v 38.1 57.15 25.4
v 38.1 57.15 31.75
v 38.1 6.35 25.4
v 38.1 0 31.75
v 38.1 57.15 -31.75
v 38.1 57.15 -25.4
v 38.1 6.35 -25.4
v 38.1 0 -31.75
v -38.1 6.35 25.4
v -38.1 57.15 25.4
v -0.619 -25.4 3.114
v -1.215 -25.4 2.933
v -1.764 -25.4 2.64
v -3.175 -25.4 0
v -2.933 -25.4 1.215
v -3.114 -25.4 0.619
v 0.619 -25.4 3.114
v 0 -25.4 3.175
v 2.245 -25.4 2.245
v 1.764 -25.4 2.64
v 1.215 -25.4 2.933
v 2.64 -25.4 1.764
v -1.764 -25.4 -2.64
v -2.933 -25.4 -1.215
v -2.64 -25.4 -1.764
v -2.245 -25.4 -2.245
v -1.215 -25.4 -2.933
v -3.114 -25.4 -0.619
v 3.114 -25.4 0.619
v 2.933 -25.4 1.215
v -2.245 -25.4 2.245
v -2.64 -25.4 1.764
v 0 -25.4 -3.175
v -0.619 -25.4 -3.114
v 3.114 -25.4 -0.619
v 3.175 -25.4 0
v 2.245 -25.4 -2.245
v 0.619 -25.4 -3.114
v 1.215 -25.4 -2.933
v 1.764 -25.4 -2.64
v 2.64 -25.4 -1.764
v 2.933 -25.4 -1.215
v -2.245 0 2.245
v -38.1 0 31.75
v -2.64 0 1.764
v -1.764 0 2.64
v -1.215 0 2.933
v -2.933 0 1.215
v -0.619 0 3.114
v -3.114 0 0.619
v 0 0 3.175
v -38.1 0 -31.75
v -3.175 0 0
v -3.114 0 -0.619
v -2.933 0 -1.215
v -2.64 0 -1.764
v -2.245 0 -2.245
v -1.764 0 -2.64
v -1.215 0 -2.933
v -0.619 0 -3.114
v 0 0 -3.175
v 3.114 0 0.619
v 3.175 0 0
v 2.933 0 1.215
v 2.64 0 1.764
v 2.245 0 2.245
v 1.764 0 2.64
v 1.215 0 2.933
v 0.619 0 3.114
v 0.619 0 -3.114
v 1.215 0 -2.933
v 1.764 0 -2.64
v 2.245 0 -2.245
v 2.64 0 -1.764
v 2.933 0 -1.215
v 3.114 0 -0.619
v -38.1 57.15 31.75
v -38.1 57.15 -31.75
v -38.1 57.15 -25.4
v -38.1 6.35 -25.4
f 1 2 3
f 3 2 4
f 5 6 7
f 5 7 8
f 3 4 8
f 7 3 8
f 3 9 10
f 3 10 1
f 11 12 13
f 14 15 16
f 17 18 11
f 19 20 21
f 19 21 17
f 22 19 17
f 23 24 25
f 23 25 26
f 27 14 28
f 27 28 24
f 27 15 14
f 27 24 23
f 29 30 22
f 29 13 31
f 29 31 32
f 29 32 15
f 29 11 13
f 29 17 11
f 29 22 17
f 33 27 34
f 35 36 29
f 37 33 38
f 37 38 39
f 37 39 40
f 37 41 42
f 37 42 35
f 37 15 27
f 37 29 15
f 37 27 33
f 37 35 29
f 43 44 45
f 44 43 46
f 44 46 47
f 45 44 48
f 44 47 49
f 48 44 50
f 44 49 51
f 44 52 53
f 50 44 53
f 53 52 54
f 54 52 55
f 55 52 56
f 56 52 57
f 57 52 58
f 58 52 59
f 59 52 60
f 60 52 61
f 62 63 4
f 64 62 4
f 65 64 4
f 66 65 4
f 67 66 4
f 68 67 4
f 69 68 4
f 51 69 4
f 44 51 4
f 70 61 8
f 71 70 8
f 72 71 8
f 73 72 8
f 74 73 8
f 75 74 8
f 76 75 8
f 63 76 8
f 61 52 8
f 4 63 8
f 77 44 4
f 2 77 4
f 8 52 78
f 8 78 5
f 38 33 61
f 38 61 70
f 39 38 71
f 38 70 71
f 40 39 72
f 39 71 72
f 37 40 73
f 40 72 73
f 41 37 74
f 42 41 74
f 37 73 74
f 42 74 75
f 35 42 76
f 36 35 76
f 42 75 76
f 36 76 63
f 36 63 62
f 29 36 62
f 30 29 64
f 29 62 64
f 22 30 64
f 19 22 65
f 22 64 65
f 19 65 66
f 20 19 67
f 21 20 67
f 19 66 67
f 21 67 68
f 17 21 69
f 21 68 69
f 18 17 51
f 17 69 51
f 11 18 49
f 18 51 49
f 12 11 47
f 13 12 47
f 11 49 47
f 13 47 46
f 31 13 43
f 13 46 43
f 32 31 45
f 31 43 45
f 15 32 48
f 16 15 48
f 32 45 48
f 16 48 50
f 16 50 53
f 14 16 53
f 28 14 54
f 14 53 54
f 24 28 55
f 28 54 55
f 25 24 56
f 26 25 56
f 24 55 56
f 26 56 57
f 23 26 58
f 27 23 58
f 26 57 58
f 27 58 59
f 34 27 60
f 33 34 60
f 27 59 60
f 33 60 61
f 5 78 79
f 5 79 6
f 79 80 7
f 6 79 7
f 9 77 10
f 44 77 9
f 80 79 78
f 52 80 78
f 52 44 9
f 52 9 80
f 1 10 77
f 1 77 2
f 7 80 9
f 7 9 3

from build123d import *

# Parameters (mm, degrees)
SKETCH1_W           = 76.2
SKETCH1_H           = 63.5
BOSS_EXTRUDE1_DEPTH = 6.35
SKETCH2_W           = 76.2
SKETCH2_H           = 6.35
BOSS_EXTRUDE2_DEPTH = 50.8
SKETCH3_R           = 3.175
BOSS_EXTRUDE3_DEPTH = 25.4


with BuildPart() as part:
    # Sketch1 → Boss-Extrude1 (new body)
    with BuildSketch(Plane(origin=(0, 0, 0), x_dir=(1, 0, 0), z_dir=(0, 1, 0))):
        Rectangle(SKETCH1_W, SKETCH1_H)
    extrude(amount=BOSS_EXTRUDE1_DEPTH)

    # Sketch2 → Boss-Extrude2 (add)
    with BuildSketch(Plane(origin=(0, 6.35, 0), x_dir=(1, 0, 0), z_dir=(0, 1, 0))):
        with Locations((0, 28.575)):
            Rectangle(SKETCH2_W, SKETCH2_H)
        with Locations((0, -28.575)):
            Rectangle(SKETCH2_W, SKETCH2_H)
    extrude(amount=BOSS_EXTRUDE2_DEPTH)

    # Sketch3 → Boss-Extrude3 (add)
    with BuildSketch(Plane.XZ):
        with Locations(Location((0, 0, 0), (0, 0, 270))):
            Circle(SKETCH3_R)
    extrude(amount=BOSS_EXTRUDE3_DEPTH)


solid = part.part
